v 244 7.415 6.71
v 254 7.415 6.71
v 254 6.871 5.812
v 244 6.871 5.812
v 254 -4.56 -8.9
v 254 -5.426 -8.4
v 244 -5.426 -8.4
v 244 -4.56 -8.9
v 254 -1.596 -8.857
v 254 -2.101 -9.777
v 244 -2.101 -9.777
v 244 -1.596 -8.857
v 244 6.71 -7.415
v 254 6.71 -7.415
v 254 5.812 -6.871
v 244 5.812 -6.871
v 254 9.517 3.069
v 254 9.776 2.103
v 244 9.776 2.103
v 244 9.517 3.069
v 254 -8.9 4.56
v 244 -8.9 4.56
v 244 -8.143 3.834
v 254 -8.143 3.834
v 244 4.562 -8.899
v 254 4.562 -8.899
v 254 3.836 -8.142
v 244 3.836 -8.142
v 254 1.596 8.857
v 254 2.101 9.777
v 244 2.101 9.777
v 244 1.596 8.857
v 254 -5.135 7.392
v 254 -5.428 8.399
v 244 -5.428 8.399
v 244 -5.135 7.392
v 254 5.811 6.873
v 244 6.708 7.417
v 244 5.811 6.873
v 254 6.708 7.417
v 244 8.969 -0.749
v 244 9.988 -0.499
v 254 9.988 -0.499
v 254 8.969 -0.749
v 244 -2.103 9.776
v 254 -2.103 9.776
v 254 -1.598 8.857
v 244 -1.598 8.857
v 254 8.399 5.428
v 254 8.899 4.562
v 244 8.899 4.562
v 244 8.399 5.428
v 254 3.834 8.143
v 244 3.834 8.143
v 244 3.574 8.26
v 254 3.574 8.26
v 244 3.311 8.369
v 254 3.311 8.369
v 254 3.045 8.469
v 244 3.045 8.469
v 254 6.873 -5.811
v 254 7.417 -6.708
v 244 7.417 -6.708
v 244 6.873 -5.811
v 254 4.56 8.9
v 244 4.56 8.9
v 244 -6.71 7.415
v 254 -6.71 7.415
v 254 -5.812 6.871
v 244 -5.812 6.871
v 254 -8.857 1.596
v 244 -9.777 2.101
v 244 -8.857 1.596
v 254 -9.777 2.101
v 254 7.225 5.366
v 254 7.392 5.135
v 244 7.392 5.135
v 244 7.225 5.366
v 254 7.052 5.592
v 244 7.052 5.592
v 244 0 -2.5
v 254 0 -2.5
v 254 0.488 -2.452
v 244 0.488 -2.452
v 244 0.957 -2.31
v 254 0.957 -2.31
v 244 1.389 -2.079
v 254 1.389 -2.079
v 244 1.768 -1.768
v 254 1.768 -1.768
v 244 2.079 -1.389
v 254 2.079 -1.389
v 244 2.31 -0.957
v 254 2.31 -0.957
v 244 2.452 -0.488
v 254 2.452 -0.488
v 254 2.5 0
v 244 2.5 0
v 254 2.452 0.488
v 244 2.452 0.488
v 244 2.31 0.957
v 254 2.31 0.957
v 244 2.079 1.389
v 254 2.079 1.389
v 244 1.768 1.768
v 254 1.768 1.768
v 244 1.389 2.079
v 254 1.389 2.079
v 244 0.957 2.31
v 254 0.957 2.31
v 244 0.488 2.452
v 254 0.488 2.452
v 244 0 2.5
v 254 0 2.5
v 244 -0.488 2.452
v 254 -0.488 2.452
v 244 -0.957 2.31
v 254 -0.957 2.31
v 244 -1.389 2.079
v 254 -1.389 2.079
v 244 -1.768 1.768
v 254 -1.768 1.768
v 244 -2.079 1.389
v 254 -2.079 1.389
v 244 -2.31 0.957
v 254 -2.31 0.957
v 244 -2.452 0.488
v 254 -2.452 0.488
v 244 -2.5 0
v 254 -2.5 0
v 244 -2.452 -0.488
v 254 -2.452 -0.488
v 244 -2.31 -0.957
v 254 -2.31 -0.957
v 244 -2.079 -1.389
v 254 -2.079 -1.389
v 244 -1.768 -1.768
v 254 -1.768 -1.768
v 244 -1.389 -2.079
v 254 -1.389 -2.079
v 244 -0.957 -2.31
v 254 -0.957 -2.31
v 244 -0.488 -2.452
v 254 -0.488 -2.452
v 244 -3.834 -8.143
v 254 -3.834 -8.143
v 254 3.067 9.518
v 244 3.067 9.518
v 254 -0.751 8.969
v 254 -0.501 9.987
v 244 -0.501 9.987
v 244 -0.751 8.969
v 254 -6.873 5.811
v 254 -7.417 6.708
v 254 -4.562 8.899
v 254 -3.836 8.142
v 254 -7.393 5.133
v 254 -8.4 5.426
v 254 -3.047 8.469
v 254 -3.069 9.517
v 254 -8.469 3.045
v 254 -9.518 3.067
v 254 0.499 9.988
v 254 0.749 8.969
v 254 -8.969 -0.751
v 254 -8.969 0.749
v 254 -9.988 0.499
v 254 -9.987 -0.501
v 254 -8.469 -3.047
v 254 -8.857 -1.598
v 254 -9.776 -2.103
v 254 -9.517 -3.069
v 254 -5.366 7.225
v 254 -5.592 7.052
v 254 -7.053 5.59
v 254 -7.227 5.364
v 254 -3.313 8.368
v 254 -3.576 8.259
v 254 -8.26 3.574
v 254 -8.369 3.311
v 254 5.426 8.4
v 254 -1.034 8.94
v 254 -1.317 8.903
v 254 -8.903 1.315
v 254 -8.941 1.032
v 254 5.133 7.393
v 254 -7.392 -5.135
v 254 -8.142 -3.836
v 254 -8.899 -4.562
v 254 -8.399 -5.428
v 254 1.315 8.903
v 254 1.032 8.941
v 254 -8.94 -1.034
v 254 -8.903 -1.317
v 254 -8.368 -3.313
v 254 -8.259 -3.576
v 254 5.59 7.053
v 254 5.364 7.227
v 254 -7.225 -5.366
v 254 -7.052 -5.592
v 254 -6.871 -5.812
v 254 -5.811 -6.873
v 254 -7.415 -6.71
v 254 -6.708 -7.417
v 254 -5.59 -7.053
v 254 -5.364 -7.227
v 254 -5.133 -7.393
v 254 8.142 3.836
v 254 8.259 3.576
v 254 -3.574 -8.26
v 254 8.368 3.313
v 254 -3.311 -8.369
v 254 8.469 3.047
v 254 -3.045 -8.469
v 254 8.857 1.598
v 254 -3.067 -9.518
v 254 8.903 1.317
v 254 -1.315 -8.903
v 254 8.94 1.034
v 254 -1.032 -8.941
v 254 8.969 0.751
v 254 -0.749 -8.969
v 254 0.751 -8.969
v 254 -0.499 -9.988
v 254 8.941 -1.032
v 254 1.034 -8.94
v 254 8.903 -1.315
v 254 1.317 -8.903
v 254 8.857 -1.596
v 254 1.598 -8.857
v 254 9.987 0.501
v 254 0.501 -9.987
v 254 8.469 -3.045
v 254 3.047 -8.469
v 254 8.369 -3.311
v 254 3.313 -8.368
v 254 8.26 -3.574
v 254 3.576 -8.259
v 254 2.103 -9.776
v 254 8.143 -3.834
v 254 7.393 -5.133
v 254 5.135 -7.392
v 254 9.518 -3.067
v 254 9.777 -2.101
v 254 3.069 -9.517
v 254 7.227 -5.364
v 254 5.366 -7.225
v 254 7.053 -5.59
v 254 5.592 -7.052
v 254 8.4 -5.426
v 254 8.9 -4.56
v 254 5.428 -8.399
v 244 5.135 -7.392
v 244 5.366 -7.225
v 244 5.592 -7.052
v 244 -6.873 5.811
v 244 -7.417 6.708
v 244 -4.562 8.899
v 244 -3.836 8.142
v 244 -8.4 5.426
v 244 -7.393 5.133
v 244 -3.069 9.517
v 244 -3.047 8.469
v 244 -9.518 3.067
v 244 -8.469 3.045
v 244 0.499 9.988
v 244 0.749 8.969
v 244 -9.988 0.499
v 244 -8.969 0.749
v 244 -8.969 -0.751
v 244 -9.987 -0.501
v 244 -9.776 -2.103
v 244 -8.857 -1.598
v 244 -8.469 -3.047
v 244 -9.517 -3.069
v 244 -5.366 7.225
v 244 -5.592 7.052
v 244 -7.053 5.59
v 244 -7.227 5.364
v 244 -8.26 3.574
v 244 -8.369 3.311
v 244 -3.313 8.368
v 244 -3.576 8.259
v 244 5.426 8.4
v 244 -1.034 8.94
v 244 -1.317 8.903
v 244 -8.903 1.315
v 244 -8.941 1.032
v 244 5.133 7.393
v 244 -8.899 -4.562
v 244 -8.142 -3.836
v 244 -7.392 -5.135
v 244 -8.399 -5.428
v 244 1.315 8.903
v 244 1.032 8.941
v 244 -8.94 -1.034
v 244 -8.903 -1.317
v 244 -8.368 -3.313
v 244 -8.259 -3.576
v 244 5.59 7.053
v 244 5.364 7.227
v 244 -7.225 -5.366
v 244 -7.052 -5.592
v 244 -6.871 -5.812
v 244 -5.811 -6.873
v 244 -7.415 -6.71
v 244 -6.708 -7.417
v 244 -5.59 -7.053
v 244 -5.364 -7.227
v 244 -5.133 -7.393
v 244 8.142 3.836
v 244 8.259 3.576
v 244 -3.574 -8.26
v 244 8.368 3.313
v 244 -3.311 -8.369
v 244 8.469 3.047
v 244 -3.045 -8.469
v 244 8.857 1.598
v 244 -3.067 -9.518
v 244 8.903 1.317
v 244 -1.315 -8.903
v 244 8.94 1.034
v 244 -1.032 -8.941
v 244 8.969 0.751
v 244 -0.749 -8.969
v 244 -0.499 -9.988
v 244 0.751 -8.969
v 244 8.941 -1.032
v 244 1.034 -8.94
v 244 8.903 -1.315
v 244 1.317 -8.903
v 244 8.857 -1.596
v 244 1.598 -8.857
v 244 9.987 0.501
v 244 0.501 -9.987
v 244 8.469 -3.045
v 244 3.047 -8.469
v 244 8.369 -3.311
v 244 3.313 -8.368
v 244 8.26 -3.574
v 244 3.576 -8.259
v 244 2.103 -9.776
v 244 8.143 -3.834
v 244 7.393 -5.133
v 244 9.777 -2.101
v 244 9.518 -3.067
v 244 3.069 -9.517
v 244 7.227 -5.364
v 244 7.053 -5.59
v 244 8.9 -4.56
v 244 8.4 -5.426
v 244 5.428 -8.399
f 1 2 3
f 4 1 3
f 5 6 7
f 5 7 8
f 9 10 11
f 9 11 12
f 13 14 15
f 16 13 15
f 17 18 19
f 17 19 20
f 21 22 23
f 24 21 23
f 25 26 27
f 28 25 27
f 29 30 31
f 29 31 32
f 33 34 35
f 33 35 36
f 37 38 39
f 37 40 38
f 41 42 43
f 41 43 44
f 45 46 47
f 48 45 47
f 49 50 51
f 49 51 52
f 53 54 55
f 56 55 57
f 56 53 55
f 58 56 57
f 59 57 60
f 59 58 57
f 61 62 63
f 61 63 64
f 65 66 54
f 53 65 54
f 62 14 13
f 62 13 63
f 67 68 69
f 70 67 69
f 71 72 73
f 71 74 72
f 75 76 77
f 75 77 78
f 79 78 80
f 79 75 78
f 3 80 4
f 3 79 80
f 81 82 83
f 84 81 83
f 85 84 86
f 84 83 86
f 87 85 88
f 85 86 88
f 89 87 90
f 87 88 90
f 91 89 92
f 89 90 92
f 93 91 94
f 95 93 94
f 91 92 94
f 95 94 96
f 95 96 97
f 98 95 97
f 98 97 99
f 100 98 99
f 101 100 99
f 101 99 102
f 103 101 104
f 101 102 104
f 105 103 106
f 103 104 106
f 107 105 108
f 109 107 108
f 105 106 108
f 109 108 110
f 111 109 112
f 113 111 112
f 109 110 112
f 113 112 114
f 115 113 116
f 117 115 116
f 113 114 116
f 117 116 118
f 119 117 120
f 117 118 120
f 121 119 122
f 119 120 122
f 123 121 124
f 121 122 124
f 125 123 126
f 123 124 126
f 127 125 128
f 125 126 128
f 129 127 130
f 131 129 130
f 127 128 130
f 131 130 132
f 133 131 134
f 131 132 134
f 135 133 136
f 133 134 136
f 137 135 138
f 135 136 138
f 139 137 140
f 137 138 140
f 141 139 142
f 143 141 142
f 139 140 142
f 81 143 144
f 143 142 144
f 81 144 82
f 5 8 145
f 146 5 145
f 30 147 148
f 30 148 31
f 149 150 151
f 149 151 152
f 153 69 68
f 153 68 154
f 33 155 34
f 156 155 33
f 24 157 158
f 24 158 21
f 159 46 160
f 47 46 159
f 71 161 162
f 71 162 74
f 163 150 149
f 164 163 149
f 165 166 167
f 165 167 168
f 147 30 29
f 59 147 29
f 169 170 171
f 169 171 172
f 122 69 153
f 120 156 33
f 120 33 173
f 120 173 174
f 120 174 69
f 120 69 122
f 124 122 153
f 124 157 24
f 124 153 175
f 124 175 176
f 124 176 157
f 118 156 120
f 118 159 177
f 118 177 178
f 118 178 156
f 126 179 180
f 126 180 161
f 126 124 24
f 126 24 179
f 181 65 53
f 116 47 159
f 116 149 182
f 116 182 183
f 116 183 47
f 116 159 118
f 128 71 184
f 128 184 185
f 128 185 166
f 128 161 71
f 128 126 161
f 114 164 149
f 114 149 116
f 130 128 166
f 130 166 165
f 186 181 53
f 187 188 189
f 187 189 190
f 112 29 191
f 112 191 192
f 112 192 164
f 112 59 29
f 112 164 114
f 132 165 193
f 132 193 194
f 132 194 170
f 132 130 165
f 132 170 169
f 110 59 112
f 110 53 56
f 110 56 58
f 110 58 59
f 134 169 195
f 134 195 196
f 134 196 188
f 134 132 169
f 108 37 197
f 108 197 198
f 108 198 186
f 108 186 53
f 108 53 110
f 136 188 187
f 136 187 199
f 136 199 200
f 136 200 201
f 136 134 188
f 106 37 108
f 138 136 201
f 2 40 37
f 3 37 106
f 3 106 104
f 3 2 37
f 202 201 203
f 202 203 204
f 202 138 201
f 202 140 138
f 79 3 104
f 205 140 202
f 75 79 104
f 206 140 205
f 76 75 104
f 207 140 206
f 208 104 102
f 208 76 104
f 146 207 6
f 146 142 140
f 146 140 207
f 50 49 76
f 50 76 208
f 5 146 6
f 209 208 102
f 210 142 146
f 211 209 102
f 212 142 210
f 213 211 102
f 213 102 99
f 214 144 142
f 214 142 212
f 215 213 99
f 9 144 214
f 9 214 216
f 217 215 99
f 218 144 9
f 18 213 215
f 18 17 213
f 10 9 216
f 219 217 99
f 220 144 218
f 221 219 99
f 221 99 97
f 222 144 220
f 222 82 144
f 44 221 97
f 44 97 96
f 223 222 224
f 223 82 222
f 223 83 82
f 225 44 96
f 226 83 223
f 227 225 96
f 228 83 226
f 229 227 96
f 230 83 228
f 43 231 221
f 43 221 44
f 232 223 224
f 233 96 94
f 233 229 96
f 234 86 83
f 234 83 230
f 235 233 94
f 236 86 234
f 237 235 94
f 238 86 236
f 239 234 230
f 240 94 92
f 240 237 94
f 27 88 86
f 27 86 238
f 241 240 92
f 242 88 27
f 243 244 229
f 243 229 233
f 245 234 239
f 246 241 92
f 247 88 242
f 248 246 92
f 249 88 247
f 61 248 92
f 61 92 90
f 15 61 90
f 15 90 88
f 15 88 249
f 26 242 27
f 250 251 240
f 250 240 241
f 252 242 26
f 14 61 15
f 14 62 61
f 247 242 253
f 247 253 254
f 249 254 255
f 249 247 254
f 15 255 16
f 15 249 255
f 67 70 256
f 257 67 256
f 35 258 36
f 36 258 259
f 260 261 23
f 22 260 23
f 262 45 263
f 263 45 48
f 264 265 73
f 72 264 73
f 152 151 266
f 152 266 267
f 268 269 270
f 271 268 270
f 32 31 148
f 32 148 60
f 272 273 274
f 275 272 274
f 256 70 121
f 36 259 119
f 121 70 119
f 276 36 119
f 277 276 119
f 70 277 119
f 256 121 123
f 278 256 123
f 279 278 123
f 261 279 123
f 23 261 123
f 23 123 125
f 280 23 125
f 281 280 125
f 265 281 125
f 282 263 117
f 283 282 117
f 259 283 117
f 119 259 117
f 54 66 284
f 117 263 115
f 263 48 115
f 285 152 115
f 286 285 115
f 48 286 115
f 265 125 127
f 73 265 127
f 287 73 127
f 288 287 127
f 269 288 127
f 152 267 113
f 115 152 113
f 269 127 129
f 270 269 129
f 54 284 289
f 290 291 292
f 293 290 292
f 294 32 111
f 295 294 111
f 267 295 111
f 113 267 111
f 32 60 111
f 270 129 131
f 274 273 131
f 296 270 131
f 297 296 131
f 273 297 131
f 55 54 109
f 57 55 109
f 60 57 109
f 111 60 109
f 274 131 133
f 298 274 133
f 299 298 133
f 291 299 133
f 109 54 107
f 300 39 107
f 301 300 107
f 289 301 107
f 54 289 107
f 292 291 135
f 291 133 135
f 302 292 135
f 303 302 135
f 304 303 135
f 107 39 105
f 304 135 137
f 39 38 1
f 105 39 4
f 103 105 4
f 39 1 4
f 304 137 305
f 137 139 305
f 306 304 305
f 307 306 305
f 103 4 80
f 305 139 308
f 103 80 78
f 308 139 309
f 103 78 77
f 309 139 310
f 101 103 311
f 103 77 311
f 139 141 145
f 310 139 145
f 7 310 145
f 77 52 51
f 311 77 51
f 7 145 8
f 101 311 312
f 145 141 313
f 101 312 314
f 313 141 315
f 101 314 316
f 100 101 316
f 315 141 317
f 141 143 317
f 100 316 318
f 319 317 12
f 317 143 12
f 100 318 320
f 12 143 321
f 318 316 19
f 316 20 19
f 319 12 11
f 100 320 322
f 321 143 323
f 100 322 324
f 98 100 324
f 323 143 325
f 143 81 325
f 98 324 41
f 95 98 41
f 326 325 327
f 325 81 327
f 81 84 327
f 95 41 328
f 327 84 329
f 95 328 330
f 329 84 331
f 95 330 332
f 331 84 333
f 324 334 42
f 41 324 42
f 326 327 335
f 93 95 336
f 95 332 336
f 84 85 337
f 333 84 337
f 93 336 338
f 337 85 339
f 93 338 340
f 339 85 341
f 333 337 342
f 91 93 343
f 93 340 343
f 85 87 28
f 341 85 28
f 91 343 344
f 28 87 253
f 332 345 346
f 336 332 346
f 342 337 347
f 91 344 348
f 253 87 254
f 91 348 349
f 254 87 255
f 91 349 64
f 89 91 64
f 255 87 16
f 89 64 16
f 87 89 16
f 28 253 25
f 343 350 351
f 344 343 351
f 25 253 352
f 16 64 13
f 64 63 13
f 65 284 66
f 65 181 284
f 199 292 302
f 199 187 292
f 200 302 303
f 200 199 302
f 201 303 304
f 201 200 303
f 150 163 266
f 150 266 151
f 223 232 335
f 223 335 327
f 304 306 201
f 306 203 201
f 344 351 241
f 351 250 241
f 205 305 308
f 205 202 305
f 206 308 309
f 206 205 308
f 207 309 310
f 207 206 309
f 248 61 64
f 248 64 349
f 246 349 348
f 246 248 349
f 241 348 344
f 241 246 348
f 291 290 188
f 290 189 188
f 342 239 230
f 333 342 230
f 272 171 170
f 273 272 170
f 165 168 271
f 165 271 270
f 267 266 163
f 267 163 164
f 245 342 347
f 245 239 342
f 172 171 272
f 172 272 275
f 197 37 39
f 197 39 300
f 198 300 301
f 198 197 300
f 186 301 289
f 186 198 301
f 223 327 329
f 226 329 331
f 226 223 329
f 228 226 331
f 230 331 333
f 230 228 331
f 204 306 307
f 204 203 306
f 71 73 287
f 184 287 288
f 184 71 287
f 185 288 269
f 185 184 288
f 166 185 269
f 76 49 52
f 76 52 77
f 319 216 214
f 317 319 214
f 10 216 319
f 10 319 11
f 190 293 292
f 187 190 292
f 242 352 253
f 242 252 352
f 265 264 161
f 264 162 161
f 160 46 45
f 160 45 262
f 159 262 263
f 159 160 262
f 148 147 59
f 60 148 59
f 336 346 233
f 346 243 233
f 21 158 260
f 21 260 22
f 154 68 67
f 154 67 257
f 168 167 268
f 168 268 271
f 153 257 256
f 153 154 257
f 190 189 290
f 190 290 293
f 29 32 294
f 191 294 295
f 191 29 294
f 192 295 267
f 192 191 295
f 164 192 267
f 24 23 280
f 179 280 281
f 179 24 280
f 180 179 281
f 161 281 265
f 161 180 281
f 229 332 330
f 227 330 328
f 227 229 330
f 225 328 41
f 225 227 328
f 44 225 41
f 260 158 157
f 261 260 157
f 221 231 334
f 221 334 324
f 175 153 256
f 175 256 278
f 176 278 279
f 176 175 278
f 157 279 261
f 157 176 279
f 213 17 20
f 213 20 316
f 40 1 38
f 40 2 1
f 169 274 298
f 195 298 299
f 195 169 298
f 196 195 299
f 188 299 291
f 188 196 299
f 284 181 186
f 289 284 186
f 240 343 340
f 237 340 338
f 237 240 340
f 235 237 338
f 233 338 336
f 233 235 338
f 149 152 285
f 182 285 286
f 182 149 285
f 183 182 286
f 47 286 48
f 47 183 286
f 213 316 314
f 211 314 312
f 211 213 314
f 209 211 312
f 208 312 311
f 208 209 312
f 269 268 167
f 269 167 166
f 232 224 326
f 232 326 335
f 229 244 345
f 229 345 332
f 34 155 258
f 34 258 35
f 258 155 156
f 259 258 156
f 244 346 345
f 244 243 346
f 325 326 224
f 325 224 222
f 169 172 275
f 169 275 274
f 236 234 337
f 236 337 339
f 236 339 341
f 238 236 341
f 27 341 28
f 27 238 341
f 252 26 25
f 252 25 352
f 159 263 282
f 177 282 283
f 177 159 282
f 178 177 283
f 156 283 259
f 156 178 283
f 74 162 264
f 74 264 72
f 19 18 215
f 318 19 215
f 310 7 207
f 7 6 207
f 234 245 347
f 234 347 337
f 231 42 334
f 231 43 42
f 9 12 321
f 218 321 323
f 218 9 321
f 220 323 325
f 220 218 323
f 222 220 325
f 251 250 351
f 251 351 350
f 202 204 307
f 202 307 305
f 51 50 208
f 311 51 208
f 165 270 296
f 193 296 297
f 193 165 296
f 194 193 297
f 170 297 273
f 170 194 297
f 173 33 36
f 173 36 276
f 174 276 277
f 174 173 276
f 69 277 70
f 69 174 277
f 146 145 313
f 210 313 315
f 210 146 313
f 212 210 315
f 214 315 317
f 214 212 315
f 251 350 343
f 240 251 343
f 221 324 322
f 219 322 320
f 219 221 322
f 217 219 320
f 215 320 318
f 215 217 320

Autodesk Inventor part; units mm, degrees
ref_plane "Work Plane1" through (254, 0, 0) normal (1, 0, 0) x (0, 0, -1)
ref_plane "Work Plane2" through (254, 0, 0) normal (1, 0, 0) x (0, 0, -1)
sketch "Sketch3" plane through (254, 0, 0) normal (1, 0, 0) x (0, 0, -1)
  arc A0 (-0.5014, 9.9874) -> (0.4986, 9.9876) centre (0, 0) ccw
  line L0 (0.4986, 9.9876) -> (-0.5014, 9.9874)
  line L1 (-0.5014, 9.9874) -> (-0.7511, 8.9686)
  line L2 (0.4986, 9.9876) -> (0.7489, 8.9688)
  line L3 (-3.0693, 9.5173) -> (-3.0468, 8.4686)
  line L4 (-2.1034, 9.7763) -> (-3.0693, 9.5173)
  line L5 (-2.1034, 9.7763) -> (-1.5979, 8.857)
  line L6 (-5.428, 8.3986) -> (-5.1348, 7.3915)
  line L7 (-4.562, 8.8988) -> (-5.428, 8.3986)
  line L8 (-4.562, 8.8988) -> (-3.8358, 8.1416)
  line L9 (-7.4167, 6.7076) -> (-6.8729, 5.8106)
  line L10 (-6.7097, 7.4148) -> (-7.4167, 6.7076)
  line L11 (-6.7097, 7.4148) -> (-5.8124, 6.8714)
  line L12 (-8.9001, 4.5595) -> (-8.1426, 3.8338)
  line L13 (-8.4002, 5.4256) -> (-8.9001, 4.5595)
  line L14 (-8.4002, 5.4256) -> (-7.3928, 5.1329)
  line L15 (-9.7769, 2.1006) -> (-8.8574, 1.5957)
  line L16 (-9.5182, 3.0666) -> (-9.7769, 2.1006)
  line L17 (-9.5182, 3.0666) -> (-8.4694, 3.0447)
  line L18 (-9.9874, -0.5014) -> (-8.9686, -0.7511)
  line L19 (-9.9876, 0.4986) -> (-9.9874, -0.5014)
  line L20 (-9.9876, 0.4986) -> (-8.9688, 0.7489)
  line L21 (-9.5173, -3.0693) -> (-8.4686, -3.0468)
  line L22 (-9.7763, -2.1034) -> (-9.5173, -3.0693)
  line L23 (-9.7763, -2.1034) -> (-8.857, -1.5979)
  line L24 (-8.3986, -5.428) -> (-7.3915, -5.1348)
  line L25 (-8.8988, -4.562) -> (-8.3986, -5.428)
  line L26 (-8.8988, -4.562) -> (-8.1416, -3.8358)
  line L27 (-6.7076, -7.4167) -> (-5.8106, -6.8729)
  line L28 (-7.4148, -6.7097) -> (-6.7076, -7.4167)
  line L29 (-7.4148, -6.7097) -> (-6.8714, -5.8124)
  line L30 (-4.5595, -8.9001) -> (-3.8338, -8.1426)
  line L31 (-5.4256, -8.4002) -> (-4.5595, -8.9001)
  line L32 (-5.4256, -8.4002) -> (-5.1329, -7.3928)
  line L33 (-2.1006, -9.7769) -> (-1.5957, -8.8574)
  line L34 (-3.0666, -9.5182) -> (-2.1006, -9.7769)
  line L35 (-3.0666, -9.5182) -> (-3.0447, -8.4694)
  line L36 (0.5014, -9.9874) -> (0.7511, -8.9686)
  line L37 (-0.4986, -9.9876) -> (0.5014, -9.9874)
  line L38 (-0.4986, -9.9876) -> (-0.7489, -8.9688)
  line L39 (3.0693, -9.5173) -> (3.0468, -8.4686)
  line L40 (2.1034, -9.7763) -> (3.0693, -9.5173)
  line L41 (2.1034, -9.7763) -> (1.5979, -8.857)
  line L42 (5.428, -8.3986) -> (5.1348, -7.3915)
  line L43 (4.562, -8.8988) -> (5.428, -8.3986)
  line L44 (4.562, -8.8988) -> (3.8358, -8.1416)
  line L45 (7.4167, -6.7076) -> (6.8729, -5.8106)
  line L46 (6.7097, -7.4148) -> (7.4167, -6.7076)
  line L47 (6.7097, -7.4148) -> (5.8124, -6.8714)
  line L48 (8.9001, -4.5595) -> (8.1426, -3.8338)
  line L49 (8.4002, -5.4256) -> (8.9001, -4.5595)
  line L50 (8.4002, -5.4256) -> (7.3928, -5.1329)
  line L51 (9.7769, -2.1006) -> (8.8574, -1.5957)
  line L52 (9.5182, -3.0666) -> (9.7769, -2.1006)
  line L53 (9.5182, -3.0666) -> (8.4694, -3.0447)
  line L54 (9.9874, 0.5014) -> (8.9686, 0.7511)
  line L55 (9.9876, -0.4986) -> (9.9874, 0.5014)
  line L56 (9.9876, -0.4986) -> (8.9688, -0.7489)
  line L57 (9.5173, 3.0693) -> (8.4686, 3.0468)
  line L58 (9.7763, 2.1034) -> (9.5173, 3.0693)
  line L59 (9.7763, 2.1034) -> (8.857, 1.5979)
  line L60 (8.3986, 5.428) -> (7.3915, 5.1348)
  line L61 (8.8988, 4.562) -> (8.3986, 5.428)
  line L62 (8.8988, 4.562) -> (8.1416, 3.8358)
  line L63 (6.7076, 7.4167) -> (5.8106, 6.8729)
  line L64 (7.4148, 6.7097) -> (6.7076, 7.4167)
  line L65 (7.4148, 6.7097) -> (6.8714, 5.8124)
  line L66 (4.5595, 8.9001) -> (3.8338, 8.1426)
  line L67 (5.4256, 8.4002) -> (4.5595, 8.9001)
  line L68 (5.4256, 8.4002) -> (5.1329, 7.3928)
  line L69 (2.1006, 9.7769) -> (1.5957, 8.8574)
  line L70 (3.0666, 9.5182) -> (2.1006, 9.7769)
  line L71 (3.0666, 9.5182) -> (3.0447, 8.4694)
  arc A1 (-0.7511, 8.9686) -> (-1.5979, 8.857) centre (0, 0) ccw
  arc A2 (-3.0468, 8.4686) -> (-3.8358, 8.1416) centre (0, 0) ccw
  arc A3 (-5.1348, 7.3915) -> (-5.8124, 6.8714) centre (0, 0) ccw
  arc A4 (-6.8729, 5.8106) -> (-7.3928, 5.1329) centre (0, 0) ccw
  arc A5 (-8.1426, 3.8338) -> (-8.4694, 3.0447) centre (0, 0) ccw
  arc A6 (-8.8574, 1.5957) -> (-8.9688, 0.7489) centre (0, 0) ccw
  arc A7 (-8.9686, -0.7511) -> (-8.857, -1.5979) centre (0, 0) ccw
  arc A8 (-8.4686, -3.0468) -> (-8.1416, -3.8358) centre (0, 0) ccw
  arc A9 (-7.3915, -5.1348) -> (-6.8714, -5.8124) centre (0, 0) ccw
  arc A10 (-5.8106, -6.8729) -> (-5.1329, -7.3928) centre (0, 0) ccw
  arc A11 (-3.8338, -8.1426) -> (-3.0447, -8.4694) centre (0, 0) ccw
  arc A12 (-1.5957, -8.8574) -> (-0.7489, -8.9688) centre (0, 0) ccw
  arc A13 (0.7511, -8.9686) -> (1.5979, -8.857) centre (0, 0) ccw
  arc A14 (3.0468, -8.4686) -> (3.8358, -8.1416) centre (0, 0) ccw
  arc A15 (5.1348, -7.3915) -> (5.8124, -6.8714) centre (0, 0) ccw
  arc A16 (6.8729, -5.8106) -> (7.3928, -5.1329) centre (0, 0) ccw
  arc A17 (8.1426, -3.8338) -> (8.4694, -3.0447) centre (0, 0) ccw
  arc A18 (8.8574, -1.5957) -> (8.9688, -0.7489) centre (0, 0) ccw
  arc A19 (8.9686, 0.7511) -> (8.857, 1.5979) centre (0, 0) ccw
  arc A20 (8.4686, 3.0468) -> (8.1416, 3.8358) centre (0, 0) ccw
  arc A21 (7.3915, 5.1348) -> (6.8714, 5.8124) centre (0, 0) ccw
  arc A22 (5.8106, 6.8729) -> (5.1329, 7.3928) centre (0, 0) ccw
  arc A23 (3.8338, 8.1426) -> (3.0447, 8.4694) centre (0, 0) ccw
  arc A24 (1.5957, 8.8574) -> (0.7489, 8.9688) centre (0, 0) ccw
  dimension "d24" = 1.5
  dimension "d25" = 1
  dimension "d28" = 360
extrude "Extrusion3" add sketch "Sketch3" against normal blind 10 contours L0 L2 A24 L69 L70 L71 A23 L66 L67 L68 A22 L63 L64 L65 A21 L60 L61 L62 A20 L57 L58 L59 A19 L54 L55 L56 A18 L51 L52 L53 A17 L48 L49 L50 A16 L45 L46 L47 A15 L42 L43 L44 A14 L39 L40 L41 A13 L36 L37 L38 A12 L33 L34 L35 A11 L30 L31 L32 A10 L27 L28 L29 A9 L24 L25 L26 A8 L21 L22 L23 A7 L18 L19 L20 A6 L15 L16 L17 A5 L12 L13 L14 A4 L9 L10 L11 A3 L6 L7 L8 A2 L3 L4 L5 A1 L1
ref_plane "Work Plane3" through (254, 0, 0) normal (1, 0, 0) x (0, 0, -1)
sketch "Sketch4" plane through (254, 0, 0) normal (1, 0, 0) x (0, 0, -1)
  circle A0 centre (0, 0) radius 2.5
  dimension "d32" = 5
extrude "Extrusion4" cut sketch "Sketch4" against normal blind 10
sketch "Sketch5" plane through (0, 0, 0) normal (1, 0, 0) x (0, 1, 0)
  point P0 (0, 0)
properties part number "parte adicional"
